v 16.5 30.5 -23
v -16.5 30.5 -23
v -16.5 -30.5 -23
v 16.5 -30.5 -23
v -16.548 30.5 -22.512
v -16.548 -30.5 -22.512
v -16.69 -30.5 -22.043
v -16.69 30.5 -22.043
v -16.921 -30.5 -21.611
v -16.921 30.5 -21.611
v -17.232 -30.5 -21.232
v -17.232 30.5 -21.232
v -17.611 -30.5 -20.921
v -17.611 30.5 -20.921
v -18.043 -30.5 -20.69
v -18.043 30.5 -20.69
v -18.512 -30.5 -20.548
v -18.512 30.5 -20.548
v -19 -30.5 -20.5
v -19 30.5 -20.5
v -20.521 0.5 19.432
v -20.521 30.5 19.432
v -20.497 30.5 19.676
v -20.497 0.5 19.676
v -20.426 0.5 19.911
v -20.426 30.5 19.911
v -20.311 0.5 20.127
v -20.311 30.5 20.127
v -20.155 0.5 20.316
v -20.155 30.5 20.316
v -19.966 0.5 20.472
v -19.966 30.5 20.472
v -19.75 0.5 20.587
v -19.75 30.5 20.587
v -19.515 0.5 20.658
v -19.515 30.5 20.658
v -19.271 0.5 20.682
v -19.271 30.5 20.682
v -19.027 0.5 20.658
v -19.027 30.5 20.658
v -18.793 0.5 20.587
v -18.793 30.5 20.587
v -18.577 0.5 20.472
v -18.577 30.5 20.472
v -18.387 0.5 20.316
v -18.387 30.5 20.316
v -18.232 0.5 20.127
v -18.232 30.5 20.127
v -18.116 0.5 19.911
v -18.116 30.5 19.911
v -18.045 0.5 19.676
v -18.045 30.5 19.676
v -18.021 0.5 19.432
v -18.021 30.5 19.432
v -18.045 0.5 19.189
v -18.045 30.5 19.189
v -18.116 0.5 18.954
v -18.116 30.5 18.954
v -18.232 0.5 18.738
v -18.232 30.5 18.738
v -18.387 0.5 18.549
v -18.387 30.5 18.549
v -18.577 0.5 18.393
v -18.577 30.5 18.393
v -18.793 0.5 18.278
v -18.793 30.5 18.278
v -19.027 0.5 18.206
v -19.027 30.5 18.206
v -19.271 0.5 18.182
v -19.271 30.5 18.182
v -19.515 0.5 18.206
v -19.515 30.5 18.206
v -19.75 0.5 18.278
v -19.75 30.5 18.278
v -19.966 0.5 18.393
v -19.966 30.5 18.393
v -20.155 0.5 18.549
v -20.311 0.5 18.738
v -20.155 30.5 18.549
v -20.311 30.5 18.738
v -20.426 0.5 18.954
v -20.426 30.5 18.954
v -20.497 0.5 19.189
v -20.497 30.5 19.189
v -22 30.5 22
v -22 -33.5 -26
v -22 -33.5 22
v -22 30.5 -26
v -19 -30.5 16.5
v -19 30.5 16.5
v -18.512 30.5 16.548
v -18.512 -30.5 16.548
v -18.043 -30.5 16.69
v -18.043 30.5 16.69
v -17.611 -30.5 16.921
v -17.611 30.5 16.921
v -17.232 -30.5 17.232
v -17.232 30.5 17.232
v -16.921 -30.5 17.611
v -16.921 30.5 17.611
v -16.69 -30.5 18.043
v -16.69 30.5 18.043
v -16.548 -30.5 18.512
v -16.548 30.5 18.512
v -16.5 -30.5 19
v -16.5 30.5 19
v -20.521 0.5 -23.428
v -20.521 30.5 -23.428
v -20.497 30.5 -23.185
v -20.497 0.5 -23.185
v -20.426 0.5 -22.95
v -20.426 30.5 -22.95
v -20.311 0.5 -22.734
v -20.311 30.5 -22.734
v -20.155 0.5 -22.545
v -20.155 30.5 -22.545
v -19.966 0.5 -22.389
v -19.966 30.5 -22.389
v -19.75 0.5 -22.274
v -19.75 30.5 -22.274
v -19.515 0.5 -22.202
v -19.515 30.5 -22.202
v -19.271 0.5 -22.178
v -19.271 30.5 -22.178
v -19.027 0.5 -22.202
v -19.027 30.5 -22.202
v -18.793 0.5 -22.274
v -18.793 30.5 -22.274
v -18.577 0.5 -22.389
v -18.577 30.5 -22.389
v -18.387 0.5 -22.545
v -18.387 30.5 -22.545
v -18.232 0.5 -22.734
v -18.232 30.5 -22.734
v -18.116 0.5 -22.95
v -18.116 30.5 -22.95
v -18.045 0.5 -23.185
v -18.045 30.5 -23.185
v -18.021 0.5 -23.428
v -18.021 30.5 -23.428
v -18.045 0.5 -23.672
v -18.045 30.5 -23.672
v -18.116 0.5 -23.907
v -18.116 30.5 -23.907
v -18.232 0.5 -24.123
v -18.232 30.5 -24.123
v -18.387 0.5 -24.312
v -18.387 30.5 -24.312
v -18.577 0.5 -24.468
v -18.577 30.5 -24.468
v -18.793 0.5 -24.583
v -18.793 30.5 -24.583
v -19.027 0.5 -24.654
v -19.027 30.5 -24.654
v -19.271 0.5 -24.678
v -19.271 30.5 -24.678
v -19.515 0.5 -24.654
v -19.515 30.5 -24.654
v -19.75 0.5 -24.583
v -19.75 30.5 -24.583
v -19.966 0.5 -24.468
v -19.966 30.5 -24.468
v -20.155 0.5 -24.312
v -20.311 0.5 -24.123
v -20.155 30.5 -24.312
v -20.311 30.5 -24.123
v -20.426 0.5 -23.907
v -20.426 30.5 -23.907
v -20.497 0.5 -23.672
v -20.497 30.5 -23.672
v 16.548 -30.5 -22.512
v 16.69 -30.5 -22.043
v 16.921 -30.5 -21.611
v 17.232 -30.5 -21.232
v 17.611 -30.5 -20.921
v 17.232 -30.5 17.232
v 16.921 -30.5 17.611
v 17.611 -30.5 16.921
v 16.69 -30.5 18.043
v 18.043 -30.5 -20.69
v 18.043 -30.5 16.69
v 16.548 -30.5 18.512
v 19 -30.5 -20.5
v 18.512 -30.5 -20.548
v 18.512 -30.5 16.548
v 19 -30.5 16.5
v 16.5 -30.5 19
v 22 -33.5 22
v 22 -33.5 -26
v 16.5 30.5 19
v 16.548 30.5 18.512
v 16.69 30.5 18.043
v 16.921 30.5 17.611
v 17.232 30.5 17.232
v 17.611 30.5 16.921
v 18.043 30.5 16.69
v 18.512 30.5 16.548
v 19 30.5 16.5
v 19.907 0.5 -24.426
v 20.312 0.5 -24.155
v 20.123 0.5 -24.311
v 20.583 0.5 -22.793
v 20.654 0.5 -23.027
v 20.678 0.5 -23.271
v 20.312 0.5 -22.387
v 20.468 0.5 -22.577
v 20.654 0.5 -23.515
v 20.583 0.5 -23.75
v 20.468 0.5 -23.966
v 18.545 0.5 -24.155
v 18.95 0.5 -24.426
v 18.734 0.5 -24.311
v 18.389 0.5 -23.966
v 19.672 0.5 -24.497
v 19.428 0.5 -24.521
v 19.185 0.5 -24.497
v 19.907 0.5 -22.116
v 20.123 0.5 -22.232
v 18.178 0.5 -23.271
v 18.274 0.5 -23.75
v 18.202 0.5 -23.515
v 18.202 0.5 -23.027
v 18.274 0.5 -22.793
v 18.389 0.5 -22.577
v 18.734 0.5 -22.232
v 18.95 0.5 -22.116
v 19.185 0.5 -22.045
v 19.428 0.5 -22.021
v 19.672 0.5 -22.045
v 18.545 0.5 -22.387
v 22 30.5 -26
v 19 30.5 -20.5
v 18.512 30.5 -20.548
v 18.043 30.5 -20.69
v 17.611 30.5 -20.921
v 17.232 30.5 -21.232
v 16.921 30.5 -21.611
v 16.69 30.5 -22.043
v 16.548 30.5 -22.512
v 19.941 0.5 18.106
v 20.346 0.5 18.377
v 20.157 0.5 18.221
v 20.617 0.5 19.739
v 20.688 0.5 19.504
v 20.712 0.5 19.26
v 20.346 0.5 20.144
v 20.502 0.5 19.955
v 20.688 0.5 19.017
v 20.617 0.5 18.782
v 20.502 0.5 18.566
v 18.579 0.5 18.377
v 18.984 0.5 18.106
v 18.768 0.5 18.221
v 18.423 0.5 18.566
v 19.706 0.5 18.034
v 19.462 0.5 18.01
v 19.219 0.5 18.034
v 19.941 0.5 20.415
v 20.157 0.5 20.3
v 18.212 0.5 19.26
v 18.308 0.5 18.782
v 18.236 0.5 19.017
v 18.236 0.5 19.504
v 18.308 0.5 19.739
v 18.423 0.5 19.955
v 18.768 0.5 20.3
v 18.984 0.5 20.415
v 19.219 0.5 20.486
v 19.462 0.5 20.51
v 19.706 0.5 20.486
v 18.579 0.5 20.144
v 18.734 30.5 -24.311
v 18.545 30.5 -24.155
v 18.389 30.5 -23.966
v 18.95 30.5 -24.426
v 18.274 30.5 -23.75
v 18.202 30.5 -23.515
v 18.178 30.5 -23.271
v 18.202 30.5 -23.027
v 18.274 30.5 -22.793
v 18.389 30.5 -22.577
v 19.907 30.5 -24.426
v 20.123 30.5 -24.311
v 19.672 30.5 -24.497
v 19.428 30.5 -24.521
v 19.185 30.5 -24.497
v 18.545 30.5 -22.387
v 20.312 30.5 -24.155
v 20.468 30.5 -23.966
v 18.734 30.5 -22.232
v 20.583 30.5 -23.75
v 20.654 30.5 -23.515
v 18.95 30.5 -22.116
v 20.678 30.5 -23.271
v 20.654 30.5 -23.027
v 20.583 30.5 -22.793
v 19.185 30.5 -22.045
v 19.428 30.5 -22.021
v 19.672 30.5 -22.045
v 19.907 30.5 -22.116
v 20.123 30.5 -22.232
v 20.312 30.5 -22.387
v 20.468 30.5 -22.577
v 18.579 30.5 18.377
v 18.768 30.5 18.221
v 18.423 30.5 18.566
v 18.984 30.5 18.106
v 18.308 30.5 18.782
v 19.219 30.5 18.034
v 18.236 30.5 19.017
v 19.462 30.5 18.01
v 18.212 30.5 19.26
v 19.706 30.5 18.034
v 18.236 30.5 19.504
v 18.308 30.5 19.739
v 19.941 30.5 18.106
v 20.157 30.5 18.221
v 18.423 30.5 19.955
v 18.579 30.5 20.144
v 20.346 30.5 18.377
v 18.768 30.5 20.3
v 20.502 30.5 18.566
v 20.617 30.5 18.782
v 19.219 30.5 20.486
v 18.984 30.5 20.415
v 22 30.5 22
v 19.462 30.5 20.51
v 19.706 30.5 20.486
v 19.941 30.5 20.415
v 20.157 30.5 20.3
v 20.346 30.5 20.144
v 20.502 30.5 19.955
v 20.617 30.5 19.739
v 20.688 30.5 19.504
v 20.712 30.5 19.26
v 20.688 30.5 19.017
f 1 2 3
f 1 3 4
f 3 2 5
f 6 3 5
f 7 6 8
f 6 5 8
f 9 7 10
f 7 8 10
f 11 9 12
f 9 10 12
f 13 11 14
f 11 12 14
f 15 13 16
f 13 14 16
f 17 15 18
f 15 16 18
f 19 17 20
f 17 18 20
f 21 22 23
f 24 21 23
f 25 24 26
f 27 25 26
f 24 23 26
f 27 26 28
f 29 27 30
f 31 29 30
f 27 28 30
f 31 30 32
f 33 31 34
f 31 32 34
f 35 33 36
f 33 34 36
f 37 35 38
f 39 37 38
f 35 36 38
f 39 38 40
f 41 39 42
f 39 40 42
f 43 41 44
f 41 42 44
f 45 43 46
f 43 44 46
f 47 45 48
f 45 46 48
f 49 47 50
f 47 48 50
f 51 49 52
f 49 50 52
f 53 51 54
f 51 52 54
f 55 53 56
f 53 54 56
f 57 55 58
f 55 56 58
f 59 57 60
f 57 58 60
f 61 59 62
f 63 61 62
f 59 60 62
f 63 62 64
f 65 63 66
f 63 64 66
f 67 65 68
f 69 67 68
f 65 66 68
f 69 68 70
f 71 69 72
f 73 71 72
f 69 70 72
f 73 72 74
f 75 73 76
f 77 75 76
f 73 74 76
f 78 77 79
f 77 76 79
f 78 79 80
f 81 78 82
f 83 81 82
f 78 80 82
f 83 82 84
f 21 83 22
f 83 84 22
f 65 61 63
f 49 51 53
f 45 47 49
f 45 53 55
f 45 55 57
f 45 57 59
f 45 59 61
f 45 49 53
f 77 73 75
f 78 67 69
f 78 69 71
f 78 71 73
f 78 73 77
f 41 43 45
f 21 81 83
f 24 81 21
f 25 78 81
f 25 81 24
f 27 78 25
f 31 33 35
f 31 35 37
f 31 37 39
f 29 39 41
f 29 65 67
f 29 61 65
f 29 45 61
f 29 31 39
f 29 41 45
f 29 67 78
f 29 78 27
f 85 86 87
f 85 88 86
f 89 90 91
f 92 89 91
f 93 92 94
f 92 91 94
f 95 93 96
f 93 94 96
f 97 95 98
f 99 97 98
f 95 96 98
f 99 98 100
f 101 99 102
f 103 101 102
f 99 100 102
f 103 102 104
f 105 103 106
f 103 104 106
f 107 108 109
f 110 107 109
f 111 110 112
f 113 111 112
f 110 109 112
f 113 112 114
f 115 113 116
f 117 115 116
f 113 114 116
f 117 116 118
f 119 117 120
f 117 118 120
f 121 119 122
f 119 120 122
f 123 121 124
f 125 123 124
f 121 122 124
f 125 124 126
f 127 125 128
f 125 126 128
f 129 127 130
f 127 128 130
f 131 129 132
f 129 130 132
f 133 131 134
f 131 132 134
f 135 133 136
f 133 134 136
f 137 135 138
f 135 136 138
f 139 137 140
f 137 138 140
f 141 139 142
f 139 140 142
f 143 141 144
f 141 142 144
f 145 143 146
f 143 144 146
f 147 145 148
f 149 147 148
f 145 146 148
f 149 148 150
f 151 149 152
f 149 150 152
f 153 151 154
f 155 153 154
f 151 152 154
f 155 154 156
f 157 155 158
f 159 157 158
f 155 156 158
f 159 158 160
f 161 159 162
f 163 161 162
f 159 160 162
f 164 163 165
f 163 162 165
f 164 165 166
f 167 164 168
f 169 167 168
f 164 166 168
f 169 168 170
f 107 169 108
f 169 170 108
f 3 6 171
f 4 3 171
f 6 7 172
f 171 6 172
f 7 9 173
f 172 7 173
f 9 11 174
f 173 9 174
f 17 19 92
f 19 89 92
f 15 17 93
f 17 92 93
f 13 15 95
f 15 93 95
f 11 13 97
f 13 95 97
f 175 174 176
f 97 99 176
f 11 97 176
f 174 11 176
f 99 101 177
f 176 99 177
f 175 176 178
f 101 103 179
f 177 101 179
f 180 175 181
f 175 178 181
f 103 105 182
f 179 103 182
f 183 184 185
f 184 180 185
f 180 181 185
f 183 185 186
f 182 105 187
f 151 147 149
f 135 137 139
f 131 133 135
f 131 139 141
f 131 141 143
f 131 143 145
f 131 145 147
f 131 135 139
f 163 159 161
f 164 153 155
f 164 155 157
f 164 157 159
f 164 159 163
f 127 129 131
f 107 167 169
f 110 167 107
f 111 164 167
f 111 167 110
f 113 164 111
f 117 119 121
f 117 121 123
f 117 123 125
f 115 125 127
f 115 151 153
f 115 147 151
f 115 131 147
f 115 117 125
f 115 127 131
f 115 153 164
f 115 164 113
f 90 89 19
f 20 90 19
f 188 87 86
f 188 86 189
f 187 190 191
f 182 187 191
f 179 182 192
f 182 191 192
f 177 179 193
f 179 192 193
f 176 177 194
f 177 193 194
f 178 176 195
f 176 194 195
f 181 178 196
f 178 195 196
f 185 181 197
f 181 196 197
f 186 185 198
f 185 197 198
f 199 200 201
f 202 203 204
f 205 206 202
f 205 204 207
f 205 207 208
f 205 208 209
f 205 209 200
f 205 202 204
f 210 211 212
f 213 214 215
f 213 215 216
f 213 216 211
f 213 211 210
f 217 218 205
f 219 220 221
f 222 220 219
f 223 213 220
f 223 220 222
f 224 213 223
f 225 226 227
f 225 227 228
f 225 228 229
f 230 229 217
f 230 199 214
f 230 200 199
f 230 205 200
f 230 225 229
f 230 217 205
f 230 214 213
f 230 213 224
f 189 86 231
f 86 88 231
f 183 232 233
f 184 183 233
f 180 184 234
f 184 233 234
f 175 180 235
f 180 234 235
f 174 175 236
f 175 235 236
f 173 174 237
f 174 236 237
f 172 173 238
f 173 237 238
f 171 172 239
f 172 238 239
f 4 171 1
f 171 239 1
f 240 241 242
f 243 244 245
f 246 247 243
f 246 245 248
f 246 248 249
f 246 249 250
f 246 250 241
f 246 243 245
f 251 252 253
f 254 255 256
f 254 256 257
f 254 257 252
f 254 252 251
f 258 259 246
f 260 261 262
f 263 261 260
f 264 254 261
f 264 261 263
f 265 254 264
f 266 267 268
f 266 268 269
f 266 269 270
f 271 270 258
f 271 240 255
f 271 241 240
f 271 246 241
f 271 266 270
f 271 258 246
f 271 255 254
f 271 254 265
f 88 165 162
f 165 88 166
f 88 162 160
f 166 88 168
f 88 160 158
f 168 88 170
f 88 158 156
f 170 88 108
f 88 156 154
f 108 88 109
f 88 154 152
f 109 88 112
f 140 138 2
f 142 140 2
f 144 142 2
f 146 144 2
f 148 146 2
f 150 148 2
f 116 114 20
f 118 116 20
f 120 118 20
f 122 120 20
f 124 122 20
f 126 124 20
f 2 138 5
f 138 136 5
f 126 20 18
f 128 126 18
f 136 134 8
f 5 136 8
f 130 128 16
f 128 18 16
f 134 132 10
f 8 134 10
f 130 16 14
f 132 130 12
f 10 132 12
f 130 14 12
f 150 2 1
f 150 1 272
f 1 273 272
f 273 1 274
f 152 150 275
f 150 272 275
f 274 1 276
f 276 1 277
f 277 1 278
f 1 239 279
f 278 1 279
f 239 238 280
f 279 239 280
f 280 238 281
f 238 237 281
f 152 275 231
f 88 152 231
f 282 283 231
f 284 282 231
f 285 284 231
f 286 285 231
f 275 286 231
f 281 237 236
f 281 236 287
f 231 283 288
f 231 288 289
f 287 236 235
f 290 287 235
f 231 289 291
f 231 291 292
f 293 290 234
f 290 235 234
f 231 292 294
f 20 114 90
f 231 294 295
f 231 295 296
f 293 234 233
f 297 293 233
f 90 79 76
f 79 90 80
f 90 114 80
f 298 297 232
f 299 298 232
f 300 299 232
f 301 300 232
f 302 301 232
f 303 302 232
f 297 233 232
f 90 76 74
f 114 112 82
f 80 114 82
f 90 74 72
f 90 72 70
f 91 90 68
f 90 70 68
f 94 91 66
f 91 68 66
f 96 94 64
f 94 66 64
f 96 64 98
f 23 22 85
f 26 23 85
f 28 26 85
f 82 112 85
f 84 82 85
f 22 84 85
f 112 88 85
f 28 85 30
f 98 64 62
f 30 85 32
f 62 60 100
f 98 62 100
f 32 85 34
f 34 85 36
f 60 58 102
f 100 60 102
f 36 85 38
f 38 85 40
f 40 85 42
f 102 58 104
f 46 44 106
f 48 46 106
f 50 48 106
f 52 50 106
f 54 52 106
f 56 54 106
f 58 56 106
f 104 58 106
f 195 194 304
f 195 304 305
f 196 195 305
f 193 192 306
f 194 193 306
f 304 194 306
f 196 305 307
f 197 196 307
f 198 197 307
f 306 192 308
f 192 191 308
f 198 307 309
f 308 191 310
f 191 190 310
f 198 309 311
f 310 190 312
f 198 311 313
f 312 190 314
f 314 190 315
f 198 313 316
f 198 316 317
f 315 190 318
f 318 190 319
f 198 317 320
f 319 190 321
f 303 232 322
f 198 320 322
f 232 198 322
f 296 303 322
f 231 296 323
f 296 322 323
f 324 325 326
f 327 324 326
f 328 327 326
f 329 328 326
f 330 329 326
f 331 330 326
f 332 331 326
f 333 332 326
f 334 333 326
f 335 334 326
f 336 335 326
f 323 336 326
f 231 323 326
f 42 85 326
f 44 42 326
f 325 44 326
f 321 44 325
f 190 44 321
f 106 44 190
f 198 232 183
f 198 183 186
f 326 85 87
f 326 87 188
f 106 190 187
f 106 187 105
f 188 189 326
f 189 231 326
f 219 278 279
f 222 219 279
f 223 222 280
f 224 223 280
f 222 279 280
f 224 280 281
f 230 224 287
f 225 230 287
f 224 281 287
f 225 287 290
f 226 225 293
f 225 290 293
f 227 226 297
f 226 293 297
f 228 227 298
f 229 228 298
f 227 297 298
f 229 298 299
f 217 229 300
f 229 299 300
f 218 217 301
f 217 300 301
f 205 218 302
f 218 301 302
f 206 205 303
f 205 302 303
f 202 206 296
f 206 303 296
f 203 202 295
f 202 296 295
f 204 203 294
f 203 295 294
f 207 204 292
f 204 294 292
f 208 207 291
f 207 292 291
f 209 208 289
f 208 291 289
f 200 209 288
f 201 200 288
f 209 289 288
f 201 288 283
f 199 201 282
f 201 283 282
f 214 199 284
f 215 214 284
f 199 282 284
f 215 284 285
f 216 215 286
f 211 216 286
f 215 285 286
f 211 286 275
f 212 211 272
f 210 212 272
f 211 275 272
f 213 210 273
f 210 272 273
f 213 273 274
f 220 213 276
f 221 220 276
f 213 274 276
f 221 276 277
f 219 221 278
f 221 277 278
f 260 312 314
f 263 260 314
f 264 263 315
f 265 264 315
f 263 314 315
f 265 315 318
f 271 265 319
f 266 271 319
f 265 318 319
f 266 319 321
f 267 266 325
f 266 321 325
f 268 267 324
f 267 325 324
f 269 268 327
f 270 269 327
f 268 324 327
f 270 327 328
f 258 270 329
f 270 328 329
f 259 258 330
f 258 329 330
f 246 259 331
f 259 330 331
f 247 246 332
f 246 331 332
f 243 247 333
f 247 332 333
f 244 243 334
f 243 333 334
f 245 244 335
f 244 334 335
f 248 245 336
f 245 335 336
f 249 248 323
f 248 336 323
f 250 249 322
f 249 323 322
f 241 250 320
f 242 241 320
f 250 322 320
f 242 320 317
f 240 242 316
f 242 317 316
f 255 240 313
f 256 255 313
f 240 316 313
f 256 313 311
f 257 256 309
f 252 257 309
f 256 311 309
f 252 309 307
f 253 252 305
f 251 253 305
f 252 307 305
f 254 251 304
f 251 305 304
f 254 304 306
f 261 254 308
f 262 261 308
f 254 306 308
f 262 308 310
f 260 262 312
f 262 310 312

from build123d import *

# Parameters (mm, degrees)
SKETCH003_W  = 44
SKETCH003_H  = 48
PAD002_DEPTH = 61
SKETCH004_W  = 44
SKETCH004_H  = 48
PAD003_DEPTH = 3
SKETCH005_R  = 1.25
POCKET_DEPTH = 30


with BuildPart() as part:
    # Sketch003 (on Face1 of Binder004) → Pad002 (new body)
    with BuildSketch(Plane.XZ.offset(-30.5)):
        with Locations((0, -2)):
            Rectangle(SKETCH003_W, SKETCH003_H)
        with BuildLine():
            Line((-16.5, -23), (16.5, -23))
            ThreePointArc((19, -20.5), (17.232233, -21.232233), (16.5, -23))
            Line((19, -20.5), (19, 16.499999))
            ThreePointArc((16.5, 18.999999), (17.232233, 17.232232), (19, 16.499999))
            Line((16.5, 18.999999), (-16.5, 18.999999))
            ThreePointArc((-19, 16.5), (-17.232233, 17.232233), (-16.5, 18.999999))
            Line((-19, 16.5), (-19, -20.5))
            ThreePointArc((-16.5, -23), (-17.232233, -21.232233), (-19, -20.5))
        make_face(mode=Mode.SUBTRACT)
    extrude(amount=PAD002_DEPTH)

    # Sketch004 (on Face14 of Pad002) → Pad003 (join)
    with BuildSketch(Plane.XZ.offset(30.5)):
        with Locations((0, -2)):
            Rectangle(SKETCH004_W, SKETCH004_H)
    extrude(amount=PAD003_DEPTH)

    # Sketch005 (on Face1 of Pad003) → Pocket (cut)
    with BuildSketch(Plane(origin=(0, 30.5, 0), x_dir=(-1, 0, 0), z_dir=(0, 1, 0))):
        with Locations((-19.462404, 19.260412)):
            Circle(SKETCH005_R)
        with Locations((19.271234, 19.432414)):
            Circle(SKETCH005_R)
        with Locations((19.271234, -23.428404)):
            Circle(SKETCH005_R)
        with Locations((-19.428404, -23.271234)):
            Circle(SKETCH005_R)
    extrude(amount=-POCKET_DEPTH, mode=Mode.SUBTRACT)


solid = part.part
